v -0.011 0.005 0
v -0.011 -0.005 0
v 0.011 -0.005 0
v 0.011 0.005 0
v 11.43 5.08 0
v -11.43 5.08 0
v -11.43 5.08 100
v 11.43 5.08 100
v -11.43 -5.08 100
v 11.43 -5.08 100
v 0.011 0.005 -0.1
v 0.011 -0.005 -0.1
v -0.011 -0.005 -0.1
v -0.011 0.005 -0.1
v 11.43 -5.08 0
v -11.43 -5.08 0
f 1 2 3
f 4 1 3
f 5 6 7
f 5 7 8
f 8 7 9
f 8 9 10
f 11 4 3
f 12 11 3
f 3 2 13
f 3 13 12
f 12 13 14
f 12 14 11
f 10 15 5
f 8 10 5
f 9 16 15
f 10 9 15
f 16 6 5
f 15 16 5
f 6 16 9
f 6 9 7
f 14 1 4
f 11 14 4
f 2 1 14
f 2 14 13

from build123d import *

# Parameters (mm, degrees)
RECTANGLE_W           = 22.86
RECTANGLE_H           = 10.16
EXTRUDE_DEPTH         = 100
CLONE_SCALE_SCALE     = 0.001
CLONE_PLACEMENT_ANGLE = 180


with BuildPart() as extrude_body:
    # Rectangle → Extrude (new body)
    with BuildSketch(Plane(origin=(-11.43, -5.08, 0), x_dir=(1, 0, 0), z_dir=(0, 0, 1))):
        with Locations((11.43, 5.08)):
            Rectangle(RECTANGLE_W, RECTANGLE_H)
    extrude(amount=EXTRUDE_DEPTH)


with BuildPart() as extrude001:
    # Clone base: copy of Extrude body
    add(extrude_body.part)


with BuildPart() as extrude001_1:
    # Clone scale: moved
    add(extrude001.part.scale(CLONE_SCALE_SCALE))


with BuildPart() as extrude001_2:
    # Clone placement: moved
    add(extrude001_1.part.rotate(Axis((0, 0, 0), (1, 0, 0)), CLONE_PLACEMENT_ANGLE))


solid = Compound([extrude_body.part, extrude001_2.part])
